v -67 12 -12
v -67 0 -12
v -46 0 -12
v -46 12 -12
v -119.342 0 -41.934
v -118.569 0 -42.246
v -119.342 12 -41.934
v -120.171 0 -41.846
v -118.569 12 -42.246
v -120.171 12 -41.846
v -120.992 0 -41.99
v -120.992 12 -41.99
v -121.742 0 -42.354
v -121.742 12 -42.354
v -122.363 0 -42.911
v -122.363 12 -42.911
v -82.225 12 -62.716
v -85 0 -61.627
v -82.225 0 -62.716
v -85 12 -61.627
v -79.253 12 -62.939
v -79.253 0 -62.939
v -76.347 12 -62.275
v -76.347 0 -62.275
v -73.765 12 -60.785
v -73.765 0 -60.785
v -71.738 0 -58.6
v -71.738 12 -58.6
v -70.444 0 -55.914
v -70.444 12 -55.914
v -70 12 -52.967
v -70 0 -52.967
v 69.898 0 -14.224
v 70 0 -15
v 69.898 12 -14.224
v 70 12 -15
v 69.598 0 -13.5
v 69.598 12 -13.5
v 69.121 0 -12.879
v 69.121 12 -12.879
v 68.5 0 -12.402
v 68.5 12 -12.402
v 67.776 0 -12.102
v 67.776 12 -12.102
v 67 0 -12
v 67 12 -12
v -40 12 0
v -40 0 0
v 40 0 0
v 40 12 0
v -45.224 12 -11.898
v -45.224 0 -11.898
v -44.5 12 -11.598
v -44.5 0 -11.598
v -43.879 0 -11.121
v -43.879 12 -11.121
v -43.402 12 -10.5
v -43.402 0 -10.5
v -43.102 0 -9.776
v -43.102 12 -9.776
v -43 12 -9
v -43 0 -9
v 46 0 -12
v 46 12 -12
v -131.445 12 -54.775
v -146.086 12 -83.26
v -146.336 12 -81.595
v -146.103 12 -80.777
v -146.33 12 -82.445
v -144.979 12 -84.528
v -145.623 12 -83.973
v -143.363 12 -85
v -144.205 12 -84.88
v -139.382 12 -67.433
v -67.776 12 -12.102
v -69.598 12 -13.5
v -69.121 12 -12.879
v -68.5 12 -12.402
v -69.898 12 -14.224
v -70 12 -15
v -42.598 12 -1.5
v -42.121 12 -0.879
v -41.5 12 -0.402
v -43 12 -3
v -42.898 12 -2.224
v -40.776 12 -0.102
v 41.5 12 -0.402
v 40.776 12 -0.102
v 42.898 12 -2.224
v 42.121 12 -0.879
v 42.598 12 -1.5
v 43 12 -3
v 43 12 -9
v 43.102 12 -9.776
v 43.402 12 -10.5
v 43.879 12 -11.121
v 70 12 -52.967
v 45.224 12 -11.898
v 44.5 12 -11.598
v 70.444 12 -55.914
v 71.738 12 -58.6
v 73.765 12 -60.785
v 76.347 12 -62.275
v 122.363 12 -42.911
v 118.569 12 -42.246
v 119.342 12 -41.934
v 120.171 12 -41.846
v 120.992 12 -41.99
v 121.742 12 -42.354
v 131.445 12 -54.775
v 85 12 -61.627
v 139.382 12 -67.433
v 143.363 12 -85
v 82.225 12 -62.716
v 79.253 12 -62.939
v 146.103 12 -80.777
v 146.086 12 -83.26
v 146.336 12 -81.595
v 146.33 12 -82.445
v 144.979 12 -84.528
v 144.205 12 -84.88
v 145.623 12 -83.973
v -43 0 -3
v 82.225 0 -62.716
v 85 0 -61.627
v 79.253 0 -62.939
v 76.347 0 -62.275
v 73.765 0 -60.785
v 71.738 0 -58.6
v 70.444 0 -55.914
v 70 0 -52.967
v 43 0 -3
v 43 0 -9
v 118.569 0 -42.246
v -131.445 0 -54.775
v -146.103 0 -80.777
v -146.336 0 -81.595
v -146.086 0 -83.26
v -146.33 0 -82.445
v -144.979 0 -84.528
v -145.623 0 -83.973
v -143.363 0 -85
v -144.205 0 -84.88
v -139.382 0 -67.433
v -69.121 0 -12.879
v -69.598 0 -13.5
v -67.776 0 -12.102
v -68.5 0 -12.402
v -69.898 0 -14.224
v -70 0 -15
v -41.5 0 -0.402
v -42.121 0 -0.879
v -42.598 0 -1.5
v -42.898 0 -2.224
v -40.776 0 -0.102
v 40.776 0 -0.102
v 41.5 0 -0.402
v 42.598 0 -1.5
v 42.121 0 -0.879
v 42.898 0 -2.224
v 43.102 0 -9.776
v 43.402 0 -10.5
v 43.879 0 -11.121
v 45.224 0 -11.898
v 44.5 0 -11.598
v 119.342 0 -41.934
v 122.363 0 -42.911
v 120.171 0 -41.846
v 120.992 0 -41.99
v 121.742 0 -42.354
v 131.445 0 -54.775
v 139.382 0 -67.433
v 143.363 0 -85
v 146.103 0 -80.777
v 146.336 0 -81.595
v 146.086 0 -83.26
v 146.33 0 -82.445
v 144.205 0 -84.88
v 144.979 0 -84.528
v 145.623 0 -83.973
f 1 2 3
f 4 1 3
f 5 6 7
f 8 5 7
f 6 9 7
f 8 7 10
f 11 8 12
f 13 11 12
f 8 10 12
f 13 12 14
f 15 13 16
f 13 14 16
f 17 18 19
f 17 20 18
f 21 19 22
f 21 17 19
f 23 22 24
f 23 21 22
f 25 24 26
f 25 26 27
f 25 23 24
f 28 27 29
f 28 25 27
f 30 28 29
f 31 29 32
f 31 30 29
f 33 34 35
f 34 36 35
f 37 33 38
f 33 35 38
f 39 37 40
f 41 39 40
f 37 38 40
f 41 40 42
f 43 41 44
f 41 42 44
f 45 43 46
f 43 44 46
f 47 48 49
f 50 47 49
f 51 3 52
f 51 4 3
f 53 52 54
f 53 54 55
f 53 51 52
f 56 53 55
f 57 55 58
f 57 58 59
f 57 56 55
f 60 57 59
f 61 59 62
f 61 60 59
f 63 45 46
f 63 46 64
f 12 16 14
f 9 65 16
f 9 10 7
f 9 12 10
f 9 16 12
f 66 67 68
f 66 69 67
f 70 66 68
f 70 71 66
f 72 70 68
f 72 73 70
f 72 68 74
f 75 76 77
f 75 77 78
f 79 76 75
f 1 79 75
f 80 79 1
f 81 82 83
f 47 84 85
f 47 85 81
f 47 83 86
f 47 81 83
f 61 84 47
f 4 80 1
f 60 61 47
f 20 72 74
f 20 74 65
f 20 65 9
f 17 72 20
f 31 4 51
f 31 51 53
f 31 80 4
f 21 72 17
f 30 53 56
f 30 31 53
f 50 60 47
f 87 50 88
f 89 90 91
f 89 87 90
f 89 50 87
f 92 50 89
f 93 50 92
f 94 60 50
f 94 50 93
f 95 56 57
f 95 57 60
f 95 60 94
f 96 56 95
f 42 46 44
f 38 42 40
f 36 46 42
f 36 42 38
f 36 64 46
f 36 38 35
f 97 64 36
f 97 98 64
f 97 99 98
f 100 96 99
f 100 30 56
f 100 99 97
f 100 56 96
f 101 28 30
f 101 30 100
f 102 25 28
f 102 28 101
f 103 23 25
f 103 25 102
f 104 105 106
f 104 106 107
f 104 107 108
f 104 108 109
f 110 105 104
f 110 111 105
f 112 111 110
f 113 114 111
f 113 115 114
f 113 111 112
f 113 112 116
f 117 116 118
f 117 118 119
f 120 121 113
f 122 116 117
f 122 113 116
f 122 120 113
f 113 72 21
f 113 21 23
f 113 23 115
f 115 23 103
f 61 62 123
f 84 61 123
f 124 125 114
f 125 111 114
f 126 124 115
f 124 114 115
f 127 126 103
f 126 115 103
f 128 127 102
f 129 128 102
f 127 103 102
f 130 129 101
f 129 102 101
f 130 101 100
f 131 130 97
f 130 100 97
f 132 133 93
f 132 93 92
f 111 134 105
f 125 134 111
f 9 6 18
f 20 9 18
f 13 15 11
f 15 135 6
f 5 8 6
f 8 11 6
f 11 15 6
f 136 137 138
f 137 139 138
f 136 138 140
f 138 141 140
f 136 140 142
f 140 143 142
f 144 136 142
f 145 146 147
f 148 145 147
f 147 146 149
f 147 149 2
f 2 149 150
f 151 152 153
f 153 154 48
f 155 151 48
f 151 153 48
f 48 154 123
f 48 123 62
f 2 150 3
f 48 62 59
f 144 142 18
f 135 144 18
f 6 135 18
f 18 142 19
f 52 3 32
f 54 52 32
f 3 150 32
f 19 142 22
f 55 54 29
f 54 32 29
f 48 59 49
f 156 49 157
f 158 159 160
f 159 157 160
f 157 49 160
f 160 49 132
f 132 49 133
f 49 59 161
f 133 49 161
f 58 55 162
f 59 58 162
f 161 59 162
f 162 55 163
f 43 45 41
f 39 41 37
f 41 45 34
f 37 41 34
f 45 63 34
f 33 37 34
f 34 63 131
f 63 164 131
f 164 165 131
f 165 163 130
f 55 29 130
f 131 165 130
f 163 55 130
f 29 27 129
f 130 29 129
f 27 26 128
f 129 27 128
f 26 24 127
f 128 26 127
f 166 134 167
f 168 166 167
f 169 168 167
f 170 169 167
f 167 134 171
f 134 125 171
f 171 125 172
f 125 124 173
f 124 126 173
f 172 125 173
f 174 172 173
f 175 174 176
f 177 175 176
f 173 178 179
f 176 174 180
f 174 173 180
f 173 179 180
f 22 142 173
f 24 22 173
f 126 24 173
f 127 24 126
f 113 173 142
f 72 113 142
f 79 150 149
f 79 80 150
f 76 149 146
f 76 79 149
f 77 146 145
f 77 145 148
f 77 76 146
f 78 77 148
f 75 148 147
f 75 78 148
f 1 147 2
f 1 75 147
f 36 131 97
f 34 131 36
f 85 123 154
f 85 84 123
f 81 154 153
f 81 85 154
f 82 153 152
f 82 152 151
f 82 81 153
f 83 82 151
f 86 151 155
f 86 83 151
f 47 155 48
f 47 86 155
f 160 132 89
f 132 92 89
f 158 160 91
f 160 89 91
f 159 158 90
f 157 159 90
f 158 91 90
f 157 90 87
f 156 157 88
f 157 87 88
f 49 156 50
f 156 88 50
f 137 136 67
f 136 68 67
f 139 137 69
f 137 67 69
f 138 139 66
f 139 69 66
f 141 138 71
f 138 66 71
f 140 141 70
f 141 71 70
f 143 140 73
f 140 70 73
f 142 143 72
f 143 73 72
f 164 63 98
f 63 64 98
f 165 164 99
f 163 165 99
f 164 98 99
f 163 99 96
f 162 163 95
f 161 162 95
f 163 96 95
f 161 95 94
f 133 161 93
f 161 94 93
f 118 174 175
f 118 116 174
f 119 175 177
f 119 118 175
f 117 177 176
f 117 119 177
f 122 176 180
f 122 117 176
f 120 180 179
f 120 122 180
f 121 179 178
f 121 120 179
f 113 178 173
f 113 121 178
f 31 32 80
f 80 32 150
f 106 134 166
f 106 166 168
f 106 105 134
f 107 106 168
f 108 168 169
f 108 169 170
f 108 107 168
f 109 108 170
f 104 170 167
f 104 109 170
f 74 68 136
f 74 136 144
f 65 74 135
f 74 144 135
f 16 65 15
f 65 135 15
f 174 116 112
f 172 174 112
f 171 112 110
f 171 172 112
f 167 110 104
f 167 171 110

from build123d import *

# Parameters (mm, degrees)
T_LE_DE_BASE_PLI_E1_DEPTH = 12
CONG_1_R                  = 10
CONG_2_R                  = 3


# Sheet-metal steps are written as plain solids
with BuildPart() as part:
    # Esquisse1 → Tôle de base pliée1 (new body)
    with BuildSketch(Plane(origin=(0, 0, 0), x_dir=(1, 0, 0), z_dir=(0, 1, 0))):
        with BuildLine():
            Line((0, 0), (0, 85))
            Line((0, 85), (147.915516427, 85))
            ThreePointArc((147.915516427, 85), (136.110968197, 61.894088575), (120.726964676, 41))
            Line((120.726964676, 41), (70, 70.287226711))
            Line((70, 70.287226711), (70, 12))
            Line((70, 12), (43, 12))
            Line((43, 12), (43, 0))
            Line((43, 0), (0, 0))
        make_face()
    extrude(amount=T_LE_DE_BASE_PLI_E1_DEPTH)

    # Congé1
    cong_1_edges = [part.edges().sort_by_distance(p)[0] for p in [
        (70, 6, -70.287226711),
    ]]
    fillet(cong_1_edges, radius=CONG_1_R)

    # Congé2
    cong_2_edges = [part.edges().sort_by_distance(p)[0] for p in [
        (147.915516427, 6, -85),
        (120.726964676, 6, -41),
        (70, 6, -12),
        (43, 6, -12),
        (43, 6, 0),
    ]]
    fillet(cong_2_edges, radius=CONG_2_R)

    # Symétrie1: part across plane


with BuildPart() as part_1:
    add(part.part)
    add(part.part.mirror(Plane(origin=(0, 12, 0), x_dir=(0, 0, 1), z_dir=(1, 0, 0))))


solid = part_1.part
